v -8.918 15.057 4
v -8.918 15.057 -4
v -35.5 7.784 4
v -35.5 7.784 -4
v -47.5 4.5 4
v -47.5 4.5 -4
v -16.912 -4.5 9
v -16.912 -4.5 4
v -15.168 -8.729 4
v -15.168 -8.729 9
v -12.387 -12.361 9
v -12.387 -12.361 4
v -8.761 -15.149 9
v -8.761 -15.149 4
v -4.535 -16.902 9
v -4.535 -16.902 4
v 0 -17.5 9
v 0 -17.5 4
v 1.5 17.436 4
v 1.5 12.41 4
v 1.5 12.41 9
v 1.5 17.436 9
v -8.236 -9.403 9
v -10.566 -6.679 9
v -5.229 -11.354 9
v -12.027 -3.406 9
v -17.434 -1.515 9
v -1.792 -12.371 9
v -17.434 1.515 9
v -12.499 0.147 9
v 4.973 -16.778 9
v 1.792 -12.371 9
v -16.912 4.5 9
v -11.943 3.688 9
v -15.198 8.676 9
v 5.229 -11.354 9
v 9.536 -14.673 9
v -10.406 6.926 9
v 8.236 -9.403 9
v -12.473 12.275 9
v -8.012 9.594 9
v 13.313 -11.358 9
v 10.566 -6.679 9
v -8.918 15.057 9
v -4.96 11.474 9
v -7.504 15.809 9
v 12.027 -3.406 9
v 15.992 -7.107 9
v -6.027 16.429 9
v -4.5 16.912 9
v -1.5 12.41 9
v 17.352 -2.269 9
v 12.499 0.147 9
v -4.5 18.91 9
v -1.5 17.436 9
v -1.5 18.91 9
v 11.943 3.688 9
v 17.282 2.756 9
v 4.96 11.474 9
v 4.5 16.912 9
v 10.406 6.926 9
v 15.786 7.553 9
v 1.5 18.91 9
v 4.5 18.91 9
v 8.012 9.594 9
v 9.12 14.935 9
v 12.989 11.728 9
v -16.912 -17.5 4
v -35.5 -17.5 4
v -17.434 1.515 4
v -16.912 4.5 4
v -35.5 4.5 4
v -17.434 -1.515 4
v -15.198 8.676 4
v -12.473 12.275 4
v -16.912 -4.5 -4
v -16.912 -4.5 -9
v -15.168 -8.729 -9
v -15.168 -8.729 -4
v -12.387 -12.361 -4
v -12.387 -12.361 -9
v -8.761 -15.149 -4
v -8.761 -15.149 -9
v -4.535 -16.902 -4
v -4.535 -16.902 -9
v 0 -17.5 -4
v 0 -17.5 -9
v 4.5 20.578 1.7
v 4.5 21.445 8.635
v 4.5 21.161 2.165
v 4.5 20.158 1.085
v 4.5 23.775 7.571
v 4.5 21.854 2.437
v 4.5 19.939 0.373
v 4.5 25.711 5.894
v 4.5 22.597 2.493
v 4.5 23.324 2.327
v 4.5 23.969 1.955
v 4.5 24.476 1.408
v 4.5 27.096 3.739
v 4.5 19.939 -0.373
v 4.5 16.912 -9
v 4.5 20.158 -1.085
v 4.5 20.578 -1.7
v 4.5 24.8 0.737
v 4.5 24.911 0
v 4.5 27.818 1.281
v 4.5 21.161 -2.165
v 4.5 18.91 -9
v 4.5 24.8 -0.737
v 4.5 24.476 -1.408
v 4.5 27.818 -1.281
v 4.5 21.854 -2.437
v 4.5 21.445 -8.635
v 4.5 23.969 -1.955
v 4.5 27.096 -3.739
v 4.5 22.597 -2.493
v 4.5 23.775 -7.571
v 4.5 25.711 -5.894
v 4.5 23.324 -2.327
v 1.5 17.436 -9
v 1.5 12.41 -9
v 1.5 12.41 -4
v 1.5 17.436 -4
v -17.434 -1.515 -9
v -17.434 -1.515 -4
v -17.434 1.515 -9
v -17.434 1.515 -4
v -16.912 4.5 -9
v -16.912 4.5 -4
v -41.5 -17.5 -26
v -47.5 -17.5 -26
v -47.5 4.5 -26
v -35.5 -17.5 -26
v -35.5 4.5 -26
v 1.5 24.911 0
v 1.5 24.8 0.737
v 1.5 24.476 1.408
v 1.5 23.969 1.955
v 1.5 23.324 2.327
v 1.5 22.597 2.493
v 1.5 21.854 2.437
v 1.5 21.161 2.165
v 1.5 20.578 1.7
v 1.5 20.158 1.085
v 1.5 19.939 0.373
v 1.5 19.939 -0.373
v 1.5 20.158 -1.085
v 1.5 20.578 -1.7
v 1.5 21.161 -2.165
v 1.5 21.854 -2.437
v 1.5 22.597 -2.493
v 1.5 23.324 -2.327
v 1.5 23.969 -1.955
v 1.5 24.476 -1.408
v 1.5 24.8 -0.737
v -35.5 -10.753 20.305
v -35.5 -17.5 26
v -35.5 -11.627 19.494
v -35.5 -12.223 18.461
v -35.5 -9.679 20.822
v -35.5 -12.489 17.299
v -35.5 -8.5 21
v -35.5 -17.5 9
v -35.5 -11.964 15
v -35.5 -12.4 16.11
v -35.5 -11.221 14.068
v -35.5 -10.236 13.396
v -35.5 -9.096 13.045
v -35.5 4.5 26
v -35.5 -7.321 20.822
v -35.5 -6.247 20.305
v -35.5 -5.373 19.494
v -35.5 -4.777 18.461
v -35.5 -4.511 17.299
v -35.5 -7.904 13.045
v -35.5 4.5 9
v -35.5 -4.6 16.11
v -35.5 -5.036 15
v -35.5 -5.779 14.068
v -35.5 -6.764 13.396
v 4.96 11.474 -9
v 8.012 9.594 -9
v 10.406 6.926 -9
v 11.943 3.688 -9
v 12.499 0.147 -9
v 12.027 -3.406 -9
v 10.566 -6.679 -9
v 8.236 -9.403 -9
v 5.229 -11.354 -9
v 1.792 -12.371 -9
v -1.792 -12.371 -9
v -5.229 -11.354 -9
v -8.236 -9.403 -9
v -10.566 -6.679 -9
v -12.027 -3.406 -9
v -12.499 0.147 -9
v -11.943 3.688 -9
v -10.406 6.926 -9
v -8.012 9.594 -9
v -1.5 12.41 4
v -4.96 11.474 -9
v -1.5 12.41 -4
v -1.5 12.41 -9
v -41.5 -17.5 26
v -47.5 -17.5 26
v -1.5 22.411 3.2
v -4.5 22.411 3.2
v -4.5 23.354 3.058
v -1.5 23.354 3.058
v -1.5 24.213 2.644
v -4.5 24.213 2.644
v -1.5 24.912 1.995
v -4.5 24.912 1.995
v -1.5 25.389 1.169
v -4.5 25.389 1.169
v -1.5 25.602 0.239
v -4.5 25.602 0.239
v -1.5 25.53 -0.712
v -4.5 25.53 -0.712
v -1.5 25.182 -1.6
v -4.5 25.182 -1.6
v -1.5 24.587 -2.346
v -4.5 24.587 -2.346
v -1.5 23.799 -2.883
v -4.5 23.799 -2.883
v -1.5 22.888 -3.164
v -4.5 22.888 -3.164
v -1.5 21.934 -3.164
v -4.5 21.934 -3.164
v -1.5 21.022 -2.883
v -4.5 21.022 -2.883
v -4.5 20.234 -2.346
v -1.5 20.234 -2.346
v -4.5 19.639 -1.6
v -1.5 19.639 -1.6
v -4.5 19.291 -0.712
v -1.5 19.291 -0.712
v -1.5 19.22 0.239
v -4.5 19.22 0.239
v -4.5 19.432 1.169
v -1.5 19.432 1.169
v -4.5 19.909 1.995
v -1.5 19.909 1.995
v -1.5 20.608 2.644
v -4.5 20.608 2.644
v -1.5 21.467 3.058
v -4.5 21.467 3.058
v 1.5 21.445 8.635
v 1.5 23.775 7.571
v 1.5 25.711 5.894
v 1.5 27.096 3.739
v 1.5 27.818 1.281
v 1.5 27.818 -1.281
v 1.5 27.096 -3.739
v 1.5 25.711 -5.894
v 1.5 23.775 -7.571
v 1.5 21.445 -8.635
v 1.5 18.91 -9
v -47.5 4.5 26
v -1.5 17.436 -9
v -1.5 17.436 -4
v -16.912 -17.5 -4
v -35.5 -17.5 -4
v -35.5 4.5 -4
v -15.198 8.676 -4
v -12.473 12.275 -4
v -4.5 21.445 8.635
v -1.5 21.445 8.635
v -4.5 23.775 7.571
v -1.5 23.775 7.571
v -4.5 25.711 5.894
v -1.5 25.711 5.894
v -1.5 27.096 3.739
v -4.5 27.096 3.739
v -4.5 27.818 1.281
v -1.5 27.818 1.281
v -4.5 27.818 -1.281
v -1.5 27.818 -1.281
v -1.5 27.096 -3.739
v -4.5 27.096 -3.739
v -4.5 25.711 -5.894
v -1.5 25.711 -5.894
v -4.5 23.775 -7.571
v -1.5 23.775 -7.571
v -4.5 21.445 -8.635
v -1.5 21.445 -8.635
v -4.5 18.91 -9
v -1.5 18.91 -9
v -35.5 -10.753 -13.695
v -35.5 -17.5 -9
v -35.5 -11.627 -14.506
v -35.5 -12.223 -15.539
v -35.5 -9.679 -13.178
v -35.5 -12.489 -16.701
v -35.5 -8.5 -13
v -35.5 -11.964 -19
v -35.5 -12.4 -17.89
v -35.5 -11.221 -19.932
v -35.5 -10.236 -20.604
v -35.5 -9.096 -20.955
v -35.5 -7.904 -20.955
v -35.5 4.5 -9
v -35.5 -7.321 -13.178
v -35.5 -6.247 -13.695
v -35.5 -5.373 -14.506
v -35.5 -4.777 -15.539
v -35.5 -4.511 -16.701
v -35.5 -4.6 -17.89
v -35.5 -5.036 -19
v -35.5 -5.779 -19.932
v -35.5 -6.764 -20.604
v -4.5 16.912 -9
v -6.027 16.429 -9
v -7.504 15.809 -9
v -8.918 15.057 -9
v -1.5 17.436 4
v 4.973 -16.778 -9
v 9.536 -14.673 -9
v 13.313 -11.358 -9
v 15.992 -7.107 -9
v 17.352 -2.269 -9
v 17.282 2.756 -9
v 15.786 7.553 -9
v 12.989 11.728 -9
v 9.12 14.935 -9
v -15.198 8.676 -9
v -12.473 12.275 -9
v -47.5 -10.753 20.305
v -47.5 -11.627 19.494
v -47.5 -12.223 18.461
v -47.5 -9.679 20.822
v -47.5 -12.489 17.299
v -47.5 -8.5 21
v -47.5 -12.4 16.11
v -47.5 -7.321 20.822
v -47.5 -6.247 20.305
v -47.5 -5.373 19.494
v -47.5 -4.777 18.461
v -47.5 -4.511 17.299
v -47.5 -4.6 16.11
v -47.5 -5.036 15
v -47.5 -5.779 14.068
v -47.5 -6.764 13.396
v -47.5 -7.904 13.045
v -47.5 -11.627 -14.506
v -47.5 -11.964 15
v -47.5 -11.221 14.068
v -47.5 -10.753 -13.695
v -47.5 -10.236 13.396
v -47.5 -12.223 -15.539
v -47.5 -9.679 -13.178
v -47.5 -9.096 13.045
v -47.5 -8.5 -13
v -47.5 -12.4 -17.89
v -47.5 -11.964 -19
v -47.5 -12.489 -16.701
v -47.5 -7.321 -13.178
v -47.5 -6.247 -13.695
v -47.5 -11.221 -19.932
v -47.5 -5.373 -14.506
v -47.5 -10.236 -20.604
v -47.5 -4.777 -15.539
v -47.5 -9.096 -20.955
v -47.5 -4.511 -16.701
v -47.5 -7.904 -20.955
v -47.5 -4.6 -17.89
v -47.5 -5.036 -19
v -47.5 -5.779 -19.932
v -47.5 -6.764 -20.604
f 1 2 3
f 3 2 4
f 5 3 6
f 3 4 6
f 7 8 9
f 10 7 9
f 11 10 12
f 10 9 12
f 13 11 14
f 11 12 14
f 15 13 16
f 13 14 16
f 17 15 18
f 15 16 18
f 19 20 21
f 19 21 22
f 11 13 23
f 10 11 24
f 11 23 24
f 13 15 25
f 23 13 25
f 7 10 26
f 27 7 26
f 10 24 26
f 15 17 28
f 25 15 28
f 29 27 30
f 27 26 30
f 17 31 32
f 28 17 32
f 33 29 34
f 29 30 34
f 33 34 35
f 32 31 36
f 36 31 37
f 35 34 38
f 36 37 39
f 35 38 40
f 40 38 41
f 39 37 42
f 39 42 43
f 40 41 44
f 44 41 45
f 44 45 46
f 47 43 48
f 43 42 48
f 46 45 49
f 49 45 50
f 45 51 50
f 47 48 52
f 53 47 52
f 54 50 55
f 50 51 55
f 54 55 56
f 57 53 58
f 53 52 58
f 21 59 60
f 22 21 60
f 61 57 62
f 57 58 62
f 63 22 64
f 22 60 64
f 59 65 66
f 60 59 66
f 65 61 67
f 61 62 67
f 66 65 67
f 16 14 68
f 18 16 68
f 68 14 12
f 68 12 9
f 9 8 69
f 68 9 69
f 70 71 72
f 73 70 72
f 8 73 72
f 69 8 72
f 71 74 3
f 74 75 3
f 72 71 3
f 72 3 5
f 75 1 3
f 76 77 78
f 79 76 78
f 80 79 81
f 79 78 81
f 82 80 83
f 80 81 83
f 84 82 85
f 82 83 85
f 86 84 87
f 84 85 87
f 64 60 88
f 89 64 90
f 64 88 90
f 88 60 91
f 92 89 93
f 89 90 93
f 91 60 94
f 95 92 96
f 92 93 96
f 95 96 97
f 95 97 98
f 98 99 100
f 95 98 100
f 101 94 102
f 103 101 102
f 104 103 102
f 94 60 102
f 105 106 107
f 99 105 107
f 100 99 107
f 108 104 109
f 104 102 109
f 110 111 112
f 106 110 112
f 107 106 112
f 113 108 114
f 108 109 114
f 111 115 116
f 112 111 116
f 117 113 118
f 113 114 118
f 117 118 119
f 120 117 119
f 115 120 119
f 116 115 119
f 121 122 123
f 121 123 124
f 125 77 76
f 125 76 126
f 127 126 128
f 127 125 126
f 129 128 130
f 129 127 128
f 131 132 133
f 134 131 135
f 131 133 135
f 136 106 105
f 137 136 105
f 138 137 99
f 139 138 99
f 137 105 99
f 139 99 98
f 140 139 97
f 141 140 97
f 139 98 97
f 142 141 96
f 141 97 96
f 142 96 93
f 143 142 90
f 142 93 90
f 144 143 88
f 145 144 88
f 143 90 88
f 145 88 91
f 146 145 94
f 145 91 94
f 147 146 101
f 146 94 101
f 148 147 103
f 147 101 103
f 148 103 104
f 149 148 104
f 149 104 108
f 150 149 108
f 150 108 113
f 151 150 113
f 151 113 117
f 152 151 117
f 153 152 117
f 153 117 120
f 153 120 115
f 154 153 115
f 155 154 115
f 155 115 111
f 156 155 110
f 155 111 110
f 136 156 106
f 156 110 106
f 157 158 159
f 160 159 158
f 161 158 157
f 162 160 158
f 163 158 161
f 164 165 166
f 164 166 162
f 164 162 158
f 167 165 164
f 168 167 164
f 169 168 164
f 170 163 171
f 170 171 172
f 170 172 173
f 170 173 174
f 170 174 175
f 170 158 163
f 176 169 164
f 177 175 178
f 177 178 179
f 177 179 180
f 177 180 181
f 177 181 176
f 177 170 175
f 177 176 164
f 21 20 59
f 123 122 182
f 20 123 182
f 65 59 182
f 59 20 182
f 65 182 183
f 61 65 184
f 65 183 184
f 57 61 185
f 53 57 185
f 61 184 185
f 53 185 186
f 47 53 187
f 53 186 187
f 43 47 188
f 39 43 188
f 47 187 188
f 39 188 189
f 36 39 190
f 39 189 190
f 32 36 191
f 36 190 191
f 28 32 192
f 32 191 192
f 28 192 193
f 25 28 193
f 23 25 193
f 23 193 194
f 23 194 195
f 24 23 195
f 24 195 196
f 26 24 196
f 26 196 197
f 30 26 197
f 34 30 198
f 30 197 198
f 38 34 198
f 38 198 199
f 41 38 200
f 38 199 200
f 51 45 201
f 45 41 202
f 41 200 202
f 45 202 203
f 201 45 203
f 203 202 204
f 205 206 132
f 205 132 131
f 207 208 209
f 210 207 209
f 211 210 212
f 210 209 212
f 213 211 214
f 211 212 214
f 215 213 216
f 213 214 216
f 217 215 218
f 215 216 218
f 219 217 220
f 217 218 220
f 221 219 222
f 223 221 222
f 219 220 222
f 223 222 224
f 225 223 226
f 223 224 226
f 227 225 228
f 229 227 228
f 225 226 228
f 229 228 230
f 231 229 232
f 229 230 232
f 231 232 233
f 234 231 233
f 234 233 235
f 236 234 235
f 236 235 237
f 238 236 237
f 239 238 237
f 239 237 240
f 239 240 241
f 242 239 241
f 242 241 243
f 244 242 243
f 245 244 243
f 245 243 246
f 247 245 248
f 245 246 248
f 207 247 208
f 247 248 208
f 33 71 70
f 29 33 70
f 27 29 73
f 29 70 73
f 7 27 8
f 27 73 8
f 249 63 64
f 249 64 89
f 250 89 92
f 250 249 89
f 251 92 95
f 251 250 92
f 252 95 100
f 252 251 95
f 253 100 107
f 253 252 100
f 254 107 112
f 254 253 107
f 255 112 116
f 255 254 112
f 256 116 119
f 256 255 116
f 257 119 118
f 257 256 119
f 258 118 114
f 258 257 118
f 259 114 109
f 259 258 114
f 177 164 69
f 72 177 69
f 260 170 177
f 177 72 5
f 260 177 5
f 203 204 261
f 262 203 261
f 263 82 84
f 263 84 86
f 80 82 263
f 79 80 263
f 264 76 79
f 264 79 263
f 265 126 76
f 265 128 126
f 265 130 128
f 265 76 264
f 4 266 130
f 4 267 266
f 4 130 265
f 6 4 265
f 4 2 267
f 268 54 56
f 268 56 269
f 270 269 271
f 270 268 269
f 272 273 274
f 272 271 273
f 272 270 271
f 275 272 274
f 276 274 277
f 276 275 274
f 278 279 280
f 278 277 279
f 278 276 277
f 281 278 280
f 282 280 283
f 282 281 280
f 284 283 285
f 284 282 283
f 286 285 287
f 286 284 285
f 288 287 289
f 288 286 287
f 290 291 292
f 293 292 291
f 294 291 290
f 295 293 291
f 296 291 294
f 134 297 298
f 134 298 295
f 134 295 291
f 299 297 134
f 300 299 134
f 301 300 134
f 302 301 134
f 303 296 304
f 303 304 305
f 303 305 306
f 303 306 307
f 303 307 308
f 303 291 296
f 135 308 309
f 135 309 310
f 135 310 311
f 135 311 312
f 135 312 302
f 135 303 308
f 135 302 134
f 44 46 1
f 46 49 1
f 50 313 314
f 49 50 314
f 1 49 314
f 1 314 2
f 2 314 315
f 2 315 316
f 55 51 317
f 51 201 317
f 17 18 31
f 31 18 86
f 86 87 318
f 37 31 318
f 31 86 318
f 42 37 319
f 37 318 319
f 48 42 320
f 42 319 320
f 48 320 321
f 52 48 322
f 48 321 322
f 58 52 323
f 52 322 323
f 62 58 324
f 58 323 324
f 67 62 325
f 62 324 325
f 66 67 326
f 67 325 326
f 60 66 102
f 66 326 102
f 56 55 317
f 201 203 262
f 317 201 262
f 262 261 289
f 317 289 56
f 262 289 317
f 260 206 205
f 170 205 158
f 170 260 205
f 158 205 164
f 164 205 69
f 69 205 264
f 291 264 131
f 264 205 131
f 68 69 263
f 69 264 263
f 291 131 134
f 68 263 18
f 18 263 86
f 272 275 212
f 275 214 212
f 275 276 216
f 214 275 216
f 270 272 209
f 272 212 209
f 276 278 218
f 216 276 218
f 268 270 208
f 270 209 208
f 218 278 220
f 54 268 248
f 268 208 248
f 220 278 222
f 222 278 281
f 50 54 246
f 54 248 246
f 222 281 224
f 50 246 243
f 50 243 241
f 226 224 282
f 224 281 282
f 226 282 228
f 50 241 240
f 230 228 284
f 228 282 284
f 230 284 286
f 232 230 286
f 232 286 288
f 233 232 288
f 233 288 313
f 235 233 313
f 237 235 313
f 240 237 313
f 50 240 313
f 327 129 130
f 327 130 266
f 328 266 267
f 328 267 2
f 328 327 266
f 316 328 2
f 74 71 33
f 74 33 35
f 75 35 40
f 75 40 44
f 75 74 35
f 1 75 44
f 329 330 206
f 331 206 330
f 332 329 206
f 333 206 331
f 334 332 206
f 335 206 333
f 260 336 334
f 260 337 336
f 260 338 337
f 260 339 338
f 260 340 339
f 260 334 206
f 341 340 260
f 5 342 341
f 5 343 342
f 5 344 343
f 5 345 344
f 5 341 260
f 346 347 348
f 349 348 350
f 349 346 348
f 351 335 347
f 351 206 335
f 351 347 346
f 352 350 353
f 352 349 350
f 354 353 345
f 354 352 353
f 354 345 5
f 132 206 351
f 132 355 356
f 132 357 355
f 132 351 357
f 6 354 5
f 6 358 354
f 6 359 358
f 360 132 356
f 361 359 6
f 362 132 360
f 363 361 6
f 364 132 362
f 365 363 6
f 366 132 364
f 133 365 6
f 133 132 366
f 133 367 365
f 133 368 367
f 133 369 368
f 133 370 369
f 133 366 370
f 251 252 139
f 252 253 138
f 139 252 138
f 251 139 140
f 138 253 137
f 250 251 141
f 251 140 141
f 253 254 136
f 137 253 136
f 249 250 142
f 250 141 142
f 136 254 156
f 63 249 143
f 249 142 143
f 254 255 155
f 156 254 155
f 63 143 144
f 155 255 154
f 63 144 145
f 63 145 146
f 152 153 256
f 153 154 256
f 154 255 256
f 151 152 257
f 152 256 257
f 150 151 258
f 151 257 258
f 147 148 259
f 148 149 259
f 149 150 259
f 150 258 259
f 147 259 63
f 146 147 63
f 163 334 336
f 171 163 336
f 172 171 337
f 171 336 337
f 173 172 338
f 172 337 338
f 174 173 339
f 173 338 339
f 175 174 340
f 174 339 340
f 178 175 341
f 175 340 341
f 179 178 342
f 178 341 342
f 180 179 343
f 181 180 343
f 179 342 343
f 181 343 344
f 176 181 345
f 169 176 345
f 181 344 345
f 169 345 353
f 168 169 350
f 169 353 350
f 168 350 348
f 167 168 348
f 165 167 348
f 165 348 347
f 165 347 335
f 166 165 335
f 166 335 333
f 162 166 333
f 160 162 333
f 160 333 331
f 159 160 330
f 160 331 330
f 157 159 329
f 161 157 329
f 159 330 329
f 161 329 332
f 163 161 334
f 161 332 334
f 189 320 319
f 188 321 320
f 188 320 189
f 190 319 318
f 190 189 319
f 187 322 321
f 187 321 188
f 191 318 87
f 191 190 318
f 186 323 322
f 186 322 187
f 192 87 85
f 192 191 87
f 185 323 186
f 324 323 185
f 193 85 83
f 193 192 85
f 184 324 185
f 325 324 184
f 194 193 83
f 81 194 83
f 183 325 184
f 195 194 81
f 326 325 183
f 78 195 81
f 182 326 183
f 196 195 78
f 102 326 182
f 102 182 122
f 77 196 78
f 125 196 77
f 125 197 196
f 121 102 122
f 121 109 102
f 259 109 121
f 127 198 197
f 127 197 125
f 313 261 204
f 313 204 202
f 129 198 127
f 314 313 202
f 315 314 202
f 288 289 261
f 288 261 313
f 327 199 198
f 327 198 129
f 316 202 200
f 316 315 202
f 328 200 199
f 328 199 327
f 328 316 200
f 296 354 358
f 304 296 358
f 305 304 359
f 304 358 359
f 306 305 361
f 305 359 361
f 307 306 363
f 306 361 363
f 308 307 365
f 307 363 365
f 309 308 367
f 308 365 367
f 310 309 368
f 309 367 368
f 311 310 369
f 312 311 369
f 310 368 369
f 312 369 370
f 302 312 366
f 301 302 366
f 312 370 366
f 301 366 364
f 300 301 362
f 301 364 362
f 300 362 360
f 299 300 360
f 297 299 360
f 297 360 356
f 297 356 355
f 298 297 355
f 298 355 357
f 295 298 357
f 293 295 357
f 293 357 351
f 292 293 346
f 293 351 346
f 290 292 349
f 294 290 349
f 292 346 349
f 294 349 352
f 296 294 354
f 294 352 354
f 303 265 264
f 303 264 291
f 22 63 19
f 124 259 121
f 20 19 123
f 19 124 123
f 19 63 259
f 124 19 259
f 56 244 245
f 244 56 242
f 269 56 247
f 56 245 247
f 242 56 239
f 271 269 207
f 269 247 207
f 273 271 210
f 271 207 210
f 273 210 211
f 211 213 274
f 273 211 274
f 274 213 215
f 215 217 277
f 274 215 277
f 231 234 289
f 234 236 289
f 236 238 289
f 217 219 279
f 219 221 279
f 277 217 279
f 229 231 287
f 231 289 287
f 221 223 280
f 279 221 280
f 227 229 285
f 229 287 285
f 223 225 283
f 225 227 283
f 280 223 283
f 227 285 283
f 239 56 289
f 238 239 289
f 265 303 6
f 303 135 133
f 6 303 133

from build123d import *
from OCP.BRepAlgoAPI import BRepAlgoAPI_Cut
from OCP.TopTools import TopTools_ListOfShape
from build123d.topology import SkipClean

# Parameters (mm, degrees)
BOSS_EXTRUDE1_DEPTH      = 26
BOSS_EXTRUDE1_DEPTH_BACK = 26
SKETCH1_W                = 6
SKETCH1_H                = 22
SKETCH2_W                = 17
SKETCH2_H                = 45.409673579
CUT_EXTRUDE1_DEPTH       = 60
SKETCH3_R                = 4
CUT_EXTRUDE2_DEPTH       = 12.000001
SKETCH4_W                = 12
SKETCH4_H                = 22
CUT_EXTRUDE4_DEPTH       = 18
CUT_EXTRUDE5_START       = -5
CUT_EXTRUDE5_DEPTH       = 5
CUT_EXTRUDE6_DEPTH       = 5
SKETCH8_R                = 2.5
CUT_EXTRUDE7_DEPTH       = 3
SKETCH9_W                = 18.588465887
SKETCH9_H                = 5
CUT_EXTRUDE8_DEPTH       = 22
FILLET2_RADIUS           = 9
FILLET2_LENGTH           = 3.00000065
FILLET3_RADIUS           = 9
FILLET3_LENGTH           = 3
CUT_EXTRUDE9_START       = -5
CUT_EXTRUDE9_DEPTH       = 5
BOSS_EXTRUDE2_START      = -5
SKETCH11_R               = 17.5
SKETCH11_R_2             = 12.5
BOSS_EXTRUDE2_DEPTH      = 5
CUT_EXTRUDE10_DEPTH      = 5
SKETCH13_R               = 17.5
SKETCH13_R_2             = 12.5
BOSS_EXTRUDE3_DEPTH      = 5
CUT_EXTRUDE11_START      = -18
SKETCH14_W               = 3
SKETCH14_H               = 6.500000134
CUT_EXTRUDE11_DEPTH      = 18
SKETCH15_R               = 3.2
CUT_EXTRUDE12_DEPTH      = 3.000001


with BuildPart() as part:
    # Sketch1 → Boss-Extrude1 (new, two sides: drawn at the far end of the back side and taken through both)
    with BuildSketch(Plane.XY.offset(-BOSS_EXTRUDE1_DEPTH_BACK)):
        with Locations((-44.500000239, -6.499999432)):
            Rectangle(SKETCH1_W, SKETCH1_H)
        with BuildLine():
            ThreePointArc((-2.39e-07, -17.5), (-16.878212154, -4.623413726), (-8.918281091, 15.057033652))
            Line((-8.918281091, 15.057033652), (-47.500000239, 4.500000568))
            Line((-47.500000239, 4.500000568), (-41.500000239, 4.500000568))
            Line((-41.500000239, 4.500000568), (-41.500000239, -17.499999432))
            Line((-41.500000239, -17.499999432), (-2.39e-07, -17.5))
        make_face()
        with BuildLine():
            Line((-4.500000094, 27.909673713), (-4.500000094, 16.9115345))
            ThreePointArc((-4.500000094, 16.9115345), (-2.39e-07, -17.5), (4.500000556, 16.911534377))
            Line((4.500000556, 16.911534377), (4.500000556, 27.909673579))
            Line((4.500000556, 27.909673579), (1.500000556, 27.909673579))
            Line((1.500000556, 27.909673579), (1.500000556, 12.409673579))
            ThreePointArc((1.500000556, 12.409673579), (-5.6e-07, -12.5), (-1.499999444, 12.409673713))
            Line((-1.499999444, 12.409673713), (-1.499999444, 27.909673713))
            Line((-1.499999444, 27.909673713), (-4.500000094, 27.909673713))
        make_face()
    extrude(amount=BOSS_EXTRUDE1_DEPTH + BOSS_EXTRUDE1_DEPTH_BACK)

    # Sketch2 → Cut-Extrude1 (cut)
    with BuildSketch(Plane(origin=(24.500000556, 0, 0), x_dir=(0, 0, -1), z_dir=(1, 0, 0))):
        with Locations((-17.5, 5.20483679)):
            Rectangle(SKETCH2_W, SKETCH2_H)
        with Locations((17.5, 5.20483679)):
            Rectangle(SKETCH2_W, SKETCH2_H)
    extrude(amount=-CUT_EXTRUDE1_DEPTH, mode=Mode.SUBTRACT)

    # Sketch3 → Cut-Extrude2 (cut)
    with BuildSketch(Plane.ZY.offset(47.500000239)):
        with Locations((-17, -8.499999432)):
            Circle(SKETCH3_R)
        with Locations((17, -8.499999432)):
            Circle(SKETCH3_R)
    extrude(amount=-CUT_EXTRUDE2_DEPTH, mode=Mode.SUBTRACT)


with BuildPart() as cut_extrude4_tool:
    # Sketch4 → Cut-Extrude4 (new body)
    with BuildSketch(Plane(origin=(3.08e-07, 22.5, 0), x_dir=(-0.9999999999999999, 1.3684242577770874e-08, 0), z_dir=(-1.3684242577770874e-08, -0.9999999999999999, 0))):
        with Locations((41.500000301, 15)):
            Rectangle(SKETCH4_W, SKETCH4_H)
        with Locations((41.500000301, -15)):
            Rectangle(SKETCH4_W, SKETCH4_H)
    extrude(amount=CUT_EXTRUDE4_DEPTH)


with BuildPart() as part_1:
    add(part.part)

    # Cut-Extrude4: cut by cut_extrude4_tool, with a tolerance
    cut_extrude4_stock = TopTools_ListOfShape()
    cut_extrude4_stock.Append(part_1.part.wrapped)
    cut_extrude4_tools = TopTools_ListOfShape()
    cut_extrude4_tools.Append(cut_extrude4_tool.part.wrapped)
    cut_extrude4_cut = BRepAlgoAPI_Cut()
    cut_extrude4_cut.SetArguments(cut_extrude4_stock)
    cut_extrude4_cut.SetTools(cut_extrude4_tools)
    cut_extrude4_cut.SetFuzzyValue(0.00001)
    cut_extrude4_cut.Build()
    add(Compound.cast(cut_extrude4_cut.Shape()).solids(), mode=Mode.REPLACE)

    # Sketch5 → Cut-Extrude5 (cut)
    with BuildSketch(Plane.XY.offset(9).offset(CUT_EXTRUDE5_START)):
        with BuildLine():
            Line((-47.500000239, 4.50000065), (-16.911534352, 4.50000065))
            ThreePointArc((-16.911534352, 4.50000065), (-13.951973972, 10.563731456), (-8.918281071, 15.057033663))
            Line((-8.918281071, 15.057033663), (-47.500000239, 4.50000065))
        make_face()
    extrude(amount=CUT_EXTRUDE5_DEPTH, mode=Mode.SUBTRACT)

    # Sketch7 → Cut-Extrude6 (cut)
    with BuildSketch(Plane(origin=(0, 0, -9), x_dir=(-1, 0, 0), z_dir=(0, 0, -1))):
        with BuildLine():
            Line((47.500000239, 4.50000065), (16.911534352, 4.50000065))
            ThreePointArc((16.911534352, 4.50000065), (13.951973972, 10.563731456), (8.918281071, 15.057033663))
            Line((8.918281071, 15.057033663), (47.500000239, 4.50000065))
        make_face()
    extrude(amount=-CUT_EXTRUDE6_DEPTH, mode=Mode.SUBTRACT)

    # Sketch8 → Cut-Extrude7 (cut)
    with BuildSketch(Plane(origin=(4.500000556, 0, 0), x_dir=(0, 0, -1), z_dir=(1, 0, 0))):
        with Locations(Location((0, 22.410603978, 0), (0, 0, 90))):
            Circle(SKETCH8_R)
    extrude(amount=-CUT_EXTRUDE7_DEPTH, mode=Mode.SUBTRACT)


with BuildPart() as cut_extrude8_tool:
    # Sketch9 → Cut-Extrude8 (new body)
    with BuildSketch(Plane(origin=(6.2e-08, 4.5, 0), x_dir=(1.0, -1.3684242685755665e-08, 0), z_dir=(1.3684242685755665e-08, 1.0, 0))):
        with Locations((-26.205767358, 6.5)):
            Rectangle(SKETCH9_W, SKETCH9_H)
        with Locations((-26.205767358, -6.5)):
            Rectangle(SKETCH9_W, SKETCH9_H)
    extrude(amount=-CUT_EXTRUDE8_DEPTH)


with BuildPart() as part_2:
    add(part_1.part)

    # Cut-Extrude8: cut by cut_extrude8_tool, with a tolerance
    cut_extrude8_stock = TopTools_ListOfShape()
    cut_extrude8_stock.Append(part_2.part.wrapped)
    cut_extrude8_tools = TopTools_ListOfShape()
    cut_extrude8_tools.Append(cut_extrude8_tool.part.wrapped)
    cut_extrude8_cut = BRepAlgoAPI_Cut()
    cut_extrude8_cut.SetArguments(cut_extrude8_stock)
    cut_extrude8_cut.SetTools(cut_extrude8_tools)
    cut_extrude8_cut.SetFuzzyValue(0.00001)
    cut_extrude8_cut.Build()
    add(Compound.cast(cut_extrude8_cut.Shape()).solids(), mode=Mode.REPLACE)

    # Fillet2: full round fillet: the end face becomes a half cylinder, R = half its width
    fillet2_face = Plane((-2.999999769, 27.909673579, 0), x_dir=(-1, 0, 0), z_dir=(0, 1, 0))  # on the end face: x along it, z out of the body
    fillet2_slab = fillet2_face.offset(-FILLET2_RADIUS / 2) * Box(FILLET2_LENGTH, 2 * FILLET2_RADIUS, FILLET2_RADIUS, mode=Mode.PRIVATE)  # the body's end, R deep
    fillet2_round = Plane((-2.999999769, 18.909673579, 0), x_dir=(0, 1, 0), z_dir=(-1, 0, 0)) * Cylinder(FILLET2_RADIUS, FILLET2_LENGTH, mode=Mode.PRIVATE)  # its axis R under the face
    add(fillet2_slab - fillet2_round, mode=Mode.SUBTRACT)

    # Fillet3: full round fillet: the end face becomes a half cylinder, R = half its width
    fillet3_face = Plane((3.000000556, 27.909673579, 0), x_dir=(-1, 0, 0), z_dir=(0, 1, 0))  # on the end face: x along it, z out of the body
    fillet3_slab = fillet3_face.offset(-FILLET3_RADIUS / 2) * Box(FILLET3_LENGTH, 2 * FILLET3_RADIUS, FILLET3_RADIUS, mode=Mode.PRIVATE)  # the body's end, R deep
    fillet3_round = Plane((3.000000556, 18.909673579, 0), x_dir=(0, 1, 0), z_dir=(-1, 0, 0)) * Cylinder(FILLET3_RADIUS, FILLET3_LENGTH, mode=Mode.PRIVATE)  # its axis R under the face
    add(fillet3_slab - fillet3_round, mode=Mode.SUBTRACT)

    # Sketch10 → Cut-Extrude9 (cut)
    with BuildSketch(Plane.XY.offset(9).offset(CUT_EXTRUDE9_START)):
        with BuildLine():
            Line((0, -17.5), (-16.911534475, -17.5))
            Line((-16.911534475, -17.5), (-16.911534475, -4.500000187))
            ThreePointArc((-16.911534475, -4.500000187), (-10.665364427, -13.874436985), (0, -17.5))
        make_face()
    extrude(amount=CUT_EXTRUDE9_DEPTH, mode=Mode.SUBTRACT)

    # Sketch11 → Boss-Extrude2 (add)
    with BuildSketch(Plane.XY.offset(9).offset(BOSS_EXTRUDE2_START)):
        Circle(SKETCH11_R)
        with Locations(Location((0, 0, 0), (0, 0, 83.107894852))):
            Circle(SKETCH11_R_2, mode=Mode.SUBTRACT)
    extrude(amount=BOSS_EXTRUDE2_DEPTH)

    # Sketch12 → Cut-Extrude10 (cut)
    with BuildSketch(Plane(origin=(0, 0, -9), x_dir=(-1, 0, 0), z_dir=(0, 0, -1))):
        with BuildLine():
            Line((0, -17.5), (16.911534475, -17.5))
            Line((16.911534475, -17.5), (16.911534475, -4.500000187))
            ThreePointArc((16.911534475, -4.500000187), (10.665364427, -13.874436985), (0, -17.5))
        make_face()
    extrude(amount=-CUT_EXTRUDE10_DEPTH, mode=Mode.SUBTRACT)

    # Sketch13 → Boss-Extrude3 (add)
    with BuildSketch(Plane(origin=(0, 0, -9), x_dir=(-1, 0, 0), z_dir=(0, 0, -1))):
        Circle(SKETCH13_R)
        with Locations(Location((0, 0, 0), (0, 0, 180))):
            Circle(SKETCH13_R_2, mode=Mode.SUBTRACT)
    extrude(amount=-BOSS_EXTRUDE3_DEPTH)

    # Sketch14 → Cut-Extrude11 (cut)
    with SkipClean():  # the faces are left unmerged after this step: merging them gives an invalid solid
        with BuildSketch(Plane.XY.offset(9).offset(CUT_EXTRUDE11_START)):
            with Locations((5.56e-07, 15.659673646)):
                Rectangle(SKETCH14_W, SKETCH14_H)
        extrude(amount=CUT_EXTRUDE11_DEPTH, mode=Mode.SUBTRACT)

    # Sketch15 → Cut-Extrude12 (cut)
    with SkipClean():  # the faces are left unmerged after this step: merging them gives an invalid solid
        with BuildSketch(Plane.ZY.offset(4.500000094)):
            with Locations((0, 22.41060404)):
                Circle(SKETCH15_R)
        extrude(amount=-CUT_EXTRUDE12_DEPTH, mode=Mode.SUBTRACT)


solid = part_2.part
